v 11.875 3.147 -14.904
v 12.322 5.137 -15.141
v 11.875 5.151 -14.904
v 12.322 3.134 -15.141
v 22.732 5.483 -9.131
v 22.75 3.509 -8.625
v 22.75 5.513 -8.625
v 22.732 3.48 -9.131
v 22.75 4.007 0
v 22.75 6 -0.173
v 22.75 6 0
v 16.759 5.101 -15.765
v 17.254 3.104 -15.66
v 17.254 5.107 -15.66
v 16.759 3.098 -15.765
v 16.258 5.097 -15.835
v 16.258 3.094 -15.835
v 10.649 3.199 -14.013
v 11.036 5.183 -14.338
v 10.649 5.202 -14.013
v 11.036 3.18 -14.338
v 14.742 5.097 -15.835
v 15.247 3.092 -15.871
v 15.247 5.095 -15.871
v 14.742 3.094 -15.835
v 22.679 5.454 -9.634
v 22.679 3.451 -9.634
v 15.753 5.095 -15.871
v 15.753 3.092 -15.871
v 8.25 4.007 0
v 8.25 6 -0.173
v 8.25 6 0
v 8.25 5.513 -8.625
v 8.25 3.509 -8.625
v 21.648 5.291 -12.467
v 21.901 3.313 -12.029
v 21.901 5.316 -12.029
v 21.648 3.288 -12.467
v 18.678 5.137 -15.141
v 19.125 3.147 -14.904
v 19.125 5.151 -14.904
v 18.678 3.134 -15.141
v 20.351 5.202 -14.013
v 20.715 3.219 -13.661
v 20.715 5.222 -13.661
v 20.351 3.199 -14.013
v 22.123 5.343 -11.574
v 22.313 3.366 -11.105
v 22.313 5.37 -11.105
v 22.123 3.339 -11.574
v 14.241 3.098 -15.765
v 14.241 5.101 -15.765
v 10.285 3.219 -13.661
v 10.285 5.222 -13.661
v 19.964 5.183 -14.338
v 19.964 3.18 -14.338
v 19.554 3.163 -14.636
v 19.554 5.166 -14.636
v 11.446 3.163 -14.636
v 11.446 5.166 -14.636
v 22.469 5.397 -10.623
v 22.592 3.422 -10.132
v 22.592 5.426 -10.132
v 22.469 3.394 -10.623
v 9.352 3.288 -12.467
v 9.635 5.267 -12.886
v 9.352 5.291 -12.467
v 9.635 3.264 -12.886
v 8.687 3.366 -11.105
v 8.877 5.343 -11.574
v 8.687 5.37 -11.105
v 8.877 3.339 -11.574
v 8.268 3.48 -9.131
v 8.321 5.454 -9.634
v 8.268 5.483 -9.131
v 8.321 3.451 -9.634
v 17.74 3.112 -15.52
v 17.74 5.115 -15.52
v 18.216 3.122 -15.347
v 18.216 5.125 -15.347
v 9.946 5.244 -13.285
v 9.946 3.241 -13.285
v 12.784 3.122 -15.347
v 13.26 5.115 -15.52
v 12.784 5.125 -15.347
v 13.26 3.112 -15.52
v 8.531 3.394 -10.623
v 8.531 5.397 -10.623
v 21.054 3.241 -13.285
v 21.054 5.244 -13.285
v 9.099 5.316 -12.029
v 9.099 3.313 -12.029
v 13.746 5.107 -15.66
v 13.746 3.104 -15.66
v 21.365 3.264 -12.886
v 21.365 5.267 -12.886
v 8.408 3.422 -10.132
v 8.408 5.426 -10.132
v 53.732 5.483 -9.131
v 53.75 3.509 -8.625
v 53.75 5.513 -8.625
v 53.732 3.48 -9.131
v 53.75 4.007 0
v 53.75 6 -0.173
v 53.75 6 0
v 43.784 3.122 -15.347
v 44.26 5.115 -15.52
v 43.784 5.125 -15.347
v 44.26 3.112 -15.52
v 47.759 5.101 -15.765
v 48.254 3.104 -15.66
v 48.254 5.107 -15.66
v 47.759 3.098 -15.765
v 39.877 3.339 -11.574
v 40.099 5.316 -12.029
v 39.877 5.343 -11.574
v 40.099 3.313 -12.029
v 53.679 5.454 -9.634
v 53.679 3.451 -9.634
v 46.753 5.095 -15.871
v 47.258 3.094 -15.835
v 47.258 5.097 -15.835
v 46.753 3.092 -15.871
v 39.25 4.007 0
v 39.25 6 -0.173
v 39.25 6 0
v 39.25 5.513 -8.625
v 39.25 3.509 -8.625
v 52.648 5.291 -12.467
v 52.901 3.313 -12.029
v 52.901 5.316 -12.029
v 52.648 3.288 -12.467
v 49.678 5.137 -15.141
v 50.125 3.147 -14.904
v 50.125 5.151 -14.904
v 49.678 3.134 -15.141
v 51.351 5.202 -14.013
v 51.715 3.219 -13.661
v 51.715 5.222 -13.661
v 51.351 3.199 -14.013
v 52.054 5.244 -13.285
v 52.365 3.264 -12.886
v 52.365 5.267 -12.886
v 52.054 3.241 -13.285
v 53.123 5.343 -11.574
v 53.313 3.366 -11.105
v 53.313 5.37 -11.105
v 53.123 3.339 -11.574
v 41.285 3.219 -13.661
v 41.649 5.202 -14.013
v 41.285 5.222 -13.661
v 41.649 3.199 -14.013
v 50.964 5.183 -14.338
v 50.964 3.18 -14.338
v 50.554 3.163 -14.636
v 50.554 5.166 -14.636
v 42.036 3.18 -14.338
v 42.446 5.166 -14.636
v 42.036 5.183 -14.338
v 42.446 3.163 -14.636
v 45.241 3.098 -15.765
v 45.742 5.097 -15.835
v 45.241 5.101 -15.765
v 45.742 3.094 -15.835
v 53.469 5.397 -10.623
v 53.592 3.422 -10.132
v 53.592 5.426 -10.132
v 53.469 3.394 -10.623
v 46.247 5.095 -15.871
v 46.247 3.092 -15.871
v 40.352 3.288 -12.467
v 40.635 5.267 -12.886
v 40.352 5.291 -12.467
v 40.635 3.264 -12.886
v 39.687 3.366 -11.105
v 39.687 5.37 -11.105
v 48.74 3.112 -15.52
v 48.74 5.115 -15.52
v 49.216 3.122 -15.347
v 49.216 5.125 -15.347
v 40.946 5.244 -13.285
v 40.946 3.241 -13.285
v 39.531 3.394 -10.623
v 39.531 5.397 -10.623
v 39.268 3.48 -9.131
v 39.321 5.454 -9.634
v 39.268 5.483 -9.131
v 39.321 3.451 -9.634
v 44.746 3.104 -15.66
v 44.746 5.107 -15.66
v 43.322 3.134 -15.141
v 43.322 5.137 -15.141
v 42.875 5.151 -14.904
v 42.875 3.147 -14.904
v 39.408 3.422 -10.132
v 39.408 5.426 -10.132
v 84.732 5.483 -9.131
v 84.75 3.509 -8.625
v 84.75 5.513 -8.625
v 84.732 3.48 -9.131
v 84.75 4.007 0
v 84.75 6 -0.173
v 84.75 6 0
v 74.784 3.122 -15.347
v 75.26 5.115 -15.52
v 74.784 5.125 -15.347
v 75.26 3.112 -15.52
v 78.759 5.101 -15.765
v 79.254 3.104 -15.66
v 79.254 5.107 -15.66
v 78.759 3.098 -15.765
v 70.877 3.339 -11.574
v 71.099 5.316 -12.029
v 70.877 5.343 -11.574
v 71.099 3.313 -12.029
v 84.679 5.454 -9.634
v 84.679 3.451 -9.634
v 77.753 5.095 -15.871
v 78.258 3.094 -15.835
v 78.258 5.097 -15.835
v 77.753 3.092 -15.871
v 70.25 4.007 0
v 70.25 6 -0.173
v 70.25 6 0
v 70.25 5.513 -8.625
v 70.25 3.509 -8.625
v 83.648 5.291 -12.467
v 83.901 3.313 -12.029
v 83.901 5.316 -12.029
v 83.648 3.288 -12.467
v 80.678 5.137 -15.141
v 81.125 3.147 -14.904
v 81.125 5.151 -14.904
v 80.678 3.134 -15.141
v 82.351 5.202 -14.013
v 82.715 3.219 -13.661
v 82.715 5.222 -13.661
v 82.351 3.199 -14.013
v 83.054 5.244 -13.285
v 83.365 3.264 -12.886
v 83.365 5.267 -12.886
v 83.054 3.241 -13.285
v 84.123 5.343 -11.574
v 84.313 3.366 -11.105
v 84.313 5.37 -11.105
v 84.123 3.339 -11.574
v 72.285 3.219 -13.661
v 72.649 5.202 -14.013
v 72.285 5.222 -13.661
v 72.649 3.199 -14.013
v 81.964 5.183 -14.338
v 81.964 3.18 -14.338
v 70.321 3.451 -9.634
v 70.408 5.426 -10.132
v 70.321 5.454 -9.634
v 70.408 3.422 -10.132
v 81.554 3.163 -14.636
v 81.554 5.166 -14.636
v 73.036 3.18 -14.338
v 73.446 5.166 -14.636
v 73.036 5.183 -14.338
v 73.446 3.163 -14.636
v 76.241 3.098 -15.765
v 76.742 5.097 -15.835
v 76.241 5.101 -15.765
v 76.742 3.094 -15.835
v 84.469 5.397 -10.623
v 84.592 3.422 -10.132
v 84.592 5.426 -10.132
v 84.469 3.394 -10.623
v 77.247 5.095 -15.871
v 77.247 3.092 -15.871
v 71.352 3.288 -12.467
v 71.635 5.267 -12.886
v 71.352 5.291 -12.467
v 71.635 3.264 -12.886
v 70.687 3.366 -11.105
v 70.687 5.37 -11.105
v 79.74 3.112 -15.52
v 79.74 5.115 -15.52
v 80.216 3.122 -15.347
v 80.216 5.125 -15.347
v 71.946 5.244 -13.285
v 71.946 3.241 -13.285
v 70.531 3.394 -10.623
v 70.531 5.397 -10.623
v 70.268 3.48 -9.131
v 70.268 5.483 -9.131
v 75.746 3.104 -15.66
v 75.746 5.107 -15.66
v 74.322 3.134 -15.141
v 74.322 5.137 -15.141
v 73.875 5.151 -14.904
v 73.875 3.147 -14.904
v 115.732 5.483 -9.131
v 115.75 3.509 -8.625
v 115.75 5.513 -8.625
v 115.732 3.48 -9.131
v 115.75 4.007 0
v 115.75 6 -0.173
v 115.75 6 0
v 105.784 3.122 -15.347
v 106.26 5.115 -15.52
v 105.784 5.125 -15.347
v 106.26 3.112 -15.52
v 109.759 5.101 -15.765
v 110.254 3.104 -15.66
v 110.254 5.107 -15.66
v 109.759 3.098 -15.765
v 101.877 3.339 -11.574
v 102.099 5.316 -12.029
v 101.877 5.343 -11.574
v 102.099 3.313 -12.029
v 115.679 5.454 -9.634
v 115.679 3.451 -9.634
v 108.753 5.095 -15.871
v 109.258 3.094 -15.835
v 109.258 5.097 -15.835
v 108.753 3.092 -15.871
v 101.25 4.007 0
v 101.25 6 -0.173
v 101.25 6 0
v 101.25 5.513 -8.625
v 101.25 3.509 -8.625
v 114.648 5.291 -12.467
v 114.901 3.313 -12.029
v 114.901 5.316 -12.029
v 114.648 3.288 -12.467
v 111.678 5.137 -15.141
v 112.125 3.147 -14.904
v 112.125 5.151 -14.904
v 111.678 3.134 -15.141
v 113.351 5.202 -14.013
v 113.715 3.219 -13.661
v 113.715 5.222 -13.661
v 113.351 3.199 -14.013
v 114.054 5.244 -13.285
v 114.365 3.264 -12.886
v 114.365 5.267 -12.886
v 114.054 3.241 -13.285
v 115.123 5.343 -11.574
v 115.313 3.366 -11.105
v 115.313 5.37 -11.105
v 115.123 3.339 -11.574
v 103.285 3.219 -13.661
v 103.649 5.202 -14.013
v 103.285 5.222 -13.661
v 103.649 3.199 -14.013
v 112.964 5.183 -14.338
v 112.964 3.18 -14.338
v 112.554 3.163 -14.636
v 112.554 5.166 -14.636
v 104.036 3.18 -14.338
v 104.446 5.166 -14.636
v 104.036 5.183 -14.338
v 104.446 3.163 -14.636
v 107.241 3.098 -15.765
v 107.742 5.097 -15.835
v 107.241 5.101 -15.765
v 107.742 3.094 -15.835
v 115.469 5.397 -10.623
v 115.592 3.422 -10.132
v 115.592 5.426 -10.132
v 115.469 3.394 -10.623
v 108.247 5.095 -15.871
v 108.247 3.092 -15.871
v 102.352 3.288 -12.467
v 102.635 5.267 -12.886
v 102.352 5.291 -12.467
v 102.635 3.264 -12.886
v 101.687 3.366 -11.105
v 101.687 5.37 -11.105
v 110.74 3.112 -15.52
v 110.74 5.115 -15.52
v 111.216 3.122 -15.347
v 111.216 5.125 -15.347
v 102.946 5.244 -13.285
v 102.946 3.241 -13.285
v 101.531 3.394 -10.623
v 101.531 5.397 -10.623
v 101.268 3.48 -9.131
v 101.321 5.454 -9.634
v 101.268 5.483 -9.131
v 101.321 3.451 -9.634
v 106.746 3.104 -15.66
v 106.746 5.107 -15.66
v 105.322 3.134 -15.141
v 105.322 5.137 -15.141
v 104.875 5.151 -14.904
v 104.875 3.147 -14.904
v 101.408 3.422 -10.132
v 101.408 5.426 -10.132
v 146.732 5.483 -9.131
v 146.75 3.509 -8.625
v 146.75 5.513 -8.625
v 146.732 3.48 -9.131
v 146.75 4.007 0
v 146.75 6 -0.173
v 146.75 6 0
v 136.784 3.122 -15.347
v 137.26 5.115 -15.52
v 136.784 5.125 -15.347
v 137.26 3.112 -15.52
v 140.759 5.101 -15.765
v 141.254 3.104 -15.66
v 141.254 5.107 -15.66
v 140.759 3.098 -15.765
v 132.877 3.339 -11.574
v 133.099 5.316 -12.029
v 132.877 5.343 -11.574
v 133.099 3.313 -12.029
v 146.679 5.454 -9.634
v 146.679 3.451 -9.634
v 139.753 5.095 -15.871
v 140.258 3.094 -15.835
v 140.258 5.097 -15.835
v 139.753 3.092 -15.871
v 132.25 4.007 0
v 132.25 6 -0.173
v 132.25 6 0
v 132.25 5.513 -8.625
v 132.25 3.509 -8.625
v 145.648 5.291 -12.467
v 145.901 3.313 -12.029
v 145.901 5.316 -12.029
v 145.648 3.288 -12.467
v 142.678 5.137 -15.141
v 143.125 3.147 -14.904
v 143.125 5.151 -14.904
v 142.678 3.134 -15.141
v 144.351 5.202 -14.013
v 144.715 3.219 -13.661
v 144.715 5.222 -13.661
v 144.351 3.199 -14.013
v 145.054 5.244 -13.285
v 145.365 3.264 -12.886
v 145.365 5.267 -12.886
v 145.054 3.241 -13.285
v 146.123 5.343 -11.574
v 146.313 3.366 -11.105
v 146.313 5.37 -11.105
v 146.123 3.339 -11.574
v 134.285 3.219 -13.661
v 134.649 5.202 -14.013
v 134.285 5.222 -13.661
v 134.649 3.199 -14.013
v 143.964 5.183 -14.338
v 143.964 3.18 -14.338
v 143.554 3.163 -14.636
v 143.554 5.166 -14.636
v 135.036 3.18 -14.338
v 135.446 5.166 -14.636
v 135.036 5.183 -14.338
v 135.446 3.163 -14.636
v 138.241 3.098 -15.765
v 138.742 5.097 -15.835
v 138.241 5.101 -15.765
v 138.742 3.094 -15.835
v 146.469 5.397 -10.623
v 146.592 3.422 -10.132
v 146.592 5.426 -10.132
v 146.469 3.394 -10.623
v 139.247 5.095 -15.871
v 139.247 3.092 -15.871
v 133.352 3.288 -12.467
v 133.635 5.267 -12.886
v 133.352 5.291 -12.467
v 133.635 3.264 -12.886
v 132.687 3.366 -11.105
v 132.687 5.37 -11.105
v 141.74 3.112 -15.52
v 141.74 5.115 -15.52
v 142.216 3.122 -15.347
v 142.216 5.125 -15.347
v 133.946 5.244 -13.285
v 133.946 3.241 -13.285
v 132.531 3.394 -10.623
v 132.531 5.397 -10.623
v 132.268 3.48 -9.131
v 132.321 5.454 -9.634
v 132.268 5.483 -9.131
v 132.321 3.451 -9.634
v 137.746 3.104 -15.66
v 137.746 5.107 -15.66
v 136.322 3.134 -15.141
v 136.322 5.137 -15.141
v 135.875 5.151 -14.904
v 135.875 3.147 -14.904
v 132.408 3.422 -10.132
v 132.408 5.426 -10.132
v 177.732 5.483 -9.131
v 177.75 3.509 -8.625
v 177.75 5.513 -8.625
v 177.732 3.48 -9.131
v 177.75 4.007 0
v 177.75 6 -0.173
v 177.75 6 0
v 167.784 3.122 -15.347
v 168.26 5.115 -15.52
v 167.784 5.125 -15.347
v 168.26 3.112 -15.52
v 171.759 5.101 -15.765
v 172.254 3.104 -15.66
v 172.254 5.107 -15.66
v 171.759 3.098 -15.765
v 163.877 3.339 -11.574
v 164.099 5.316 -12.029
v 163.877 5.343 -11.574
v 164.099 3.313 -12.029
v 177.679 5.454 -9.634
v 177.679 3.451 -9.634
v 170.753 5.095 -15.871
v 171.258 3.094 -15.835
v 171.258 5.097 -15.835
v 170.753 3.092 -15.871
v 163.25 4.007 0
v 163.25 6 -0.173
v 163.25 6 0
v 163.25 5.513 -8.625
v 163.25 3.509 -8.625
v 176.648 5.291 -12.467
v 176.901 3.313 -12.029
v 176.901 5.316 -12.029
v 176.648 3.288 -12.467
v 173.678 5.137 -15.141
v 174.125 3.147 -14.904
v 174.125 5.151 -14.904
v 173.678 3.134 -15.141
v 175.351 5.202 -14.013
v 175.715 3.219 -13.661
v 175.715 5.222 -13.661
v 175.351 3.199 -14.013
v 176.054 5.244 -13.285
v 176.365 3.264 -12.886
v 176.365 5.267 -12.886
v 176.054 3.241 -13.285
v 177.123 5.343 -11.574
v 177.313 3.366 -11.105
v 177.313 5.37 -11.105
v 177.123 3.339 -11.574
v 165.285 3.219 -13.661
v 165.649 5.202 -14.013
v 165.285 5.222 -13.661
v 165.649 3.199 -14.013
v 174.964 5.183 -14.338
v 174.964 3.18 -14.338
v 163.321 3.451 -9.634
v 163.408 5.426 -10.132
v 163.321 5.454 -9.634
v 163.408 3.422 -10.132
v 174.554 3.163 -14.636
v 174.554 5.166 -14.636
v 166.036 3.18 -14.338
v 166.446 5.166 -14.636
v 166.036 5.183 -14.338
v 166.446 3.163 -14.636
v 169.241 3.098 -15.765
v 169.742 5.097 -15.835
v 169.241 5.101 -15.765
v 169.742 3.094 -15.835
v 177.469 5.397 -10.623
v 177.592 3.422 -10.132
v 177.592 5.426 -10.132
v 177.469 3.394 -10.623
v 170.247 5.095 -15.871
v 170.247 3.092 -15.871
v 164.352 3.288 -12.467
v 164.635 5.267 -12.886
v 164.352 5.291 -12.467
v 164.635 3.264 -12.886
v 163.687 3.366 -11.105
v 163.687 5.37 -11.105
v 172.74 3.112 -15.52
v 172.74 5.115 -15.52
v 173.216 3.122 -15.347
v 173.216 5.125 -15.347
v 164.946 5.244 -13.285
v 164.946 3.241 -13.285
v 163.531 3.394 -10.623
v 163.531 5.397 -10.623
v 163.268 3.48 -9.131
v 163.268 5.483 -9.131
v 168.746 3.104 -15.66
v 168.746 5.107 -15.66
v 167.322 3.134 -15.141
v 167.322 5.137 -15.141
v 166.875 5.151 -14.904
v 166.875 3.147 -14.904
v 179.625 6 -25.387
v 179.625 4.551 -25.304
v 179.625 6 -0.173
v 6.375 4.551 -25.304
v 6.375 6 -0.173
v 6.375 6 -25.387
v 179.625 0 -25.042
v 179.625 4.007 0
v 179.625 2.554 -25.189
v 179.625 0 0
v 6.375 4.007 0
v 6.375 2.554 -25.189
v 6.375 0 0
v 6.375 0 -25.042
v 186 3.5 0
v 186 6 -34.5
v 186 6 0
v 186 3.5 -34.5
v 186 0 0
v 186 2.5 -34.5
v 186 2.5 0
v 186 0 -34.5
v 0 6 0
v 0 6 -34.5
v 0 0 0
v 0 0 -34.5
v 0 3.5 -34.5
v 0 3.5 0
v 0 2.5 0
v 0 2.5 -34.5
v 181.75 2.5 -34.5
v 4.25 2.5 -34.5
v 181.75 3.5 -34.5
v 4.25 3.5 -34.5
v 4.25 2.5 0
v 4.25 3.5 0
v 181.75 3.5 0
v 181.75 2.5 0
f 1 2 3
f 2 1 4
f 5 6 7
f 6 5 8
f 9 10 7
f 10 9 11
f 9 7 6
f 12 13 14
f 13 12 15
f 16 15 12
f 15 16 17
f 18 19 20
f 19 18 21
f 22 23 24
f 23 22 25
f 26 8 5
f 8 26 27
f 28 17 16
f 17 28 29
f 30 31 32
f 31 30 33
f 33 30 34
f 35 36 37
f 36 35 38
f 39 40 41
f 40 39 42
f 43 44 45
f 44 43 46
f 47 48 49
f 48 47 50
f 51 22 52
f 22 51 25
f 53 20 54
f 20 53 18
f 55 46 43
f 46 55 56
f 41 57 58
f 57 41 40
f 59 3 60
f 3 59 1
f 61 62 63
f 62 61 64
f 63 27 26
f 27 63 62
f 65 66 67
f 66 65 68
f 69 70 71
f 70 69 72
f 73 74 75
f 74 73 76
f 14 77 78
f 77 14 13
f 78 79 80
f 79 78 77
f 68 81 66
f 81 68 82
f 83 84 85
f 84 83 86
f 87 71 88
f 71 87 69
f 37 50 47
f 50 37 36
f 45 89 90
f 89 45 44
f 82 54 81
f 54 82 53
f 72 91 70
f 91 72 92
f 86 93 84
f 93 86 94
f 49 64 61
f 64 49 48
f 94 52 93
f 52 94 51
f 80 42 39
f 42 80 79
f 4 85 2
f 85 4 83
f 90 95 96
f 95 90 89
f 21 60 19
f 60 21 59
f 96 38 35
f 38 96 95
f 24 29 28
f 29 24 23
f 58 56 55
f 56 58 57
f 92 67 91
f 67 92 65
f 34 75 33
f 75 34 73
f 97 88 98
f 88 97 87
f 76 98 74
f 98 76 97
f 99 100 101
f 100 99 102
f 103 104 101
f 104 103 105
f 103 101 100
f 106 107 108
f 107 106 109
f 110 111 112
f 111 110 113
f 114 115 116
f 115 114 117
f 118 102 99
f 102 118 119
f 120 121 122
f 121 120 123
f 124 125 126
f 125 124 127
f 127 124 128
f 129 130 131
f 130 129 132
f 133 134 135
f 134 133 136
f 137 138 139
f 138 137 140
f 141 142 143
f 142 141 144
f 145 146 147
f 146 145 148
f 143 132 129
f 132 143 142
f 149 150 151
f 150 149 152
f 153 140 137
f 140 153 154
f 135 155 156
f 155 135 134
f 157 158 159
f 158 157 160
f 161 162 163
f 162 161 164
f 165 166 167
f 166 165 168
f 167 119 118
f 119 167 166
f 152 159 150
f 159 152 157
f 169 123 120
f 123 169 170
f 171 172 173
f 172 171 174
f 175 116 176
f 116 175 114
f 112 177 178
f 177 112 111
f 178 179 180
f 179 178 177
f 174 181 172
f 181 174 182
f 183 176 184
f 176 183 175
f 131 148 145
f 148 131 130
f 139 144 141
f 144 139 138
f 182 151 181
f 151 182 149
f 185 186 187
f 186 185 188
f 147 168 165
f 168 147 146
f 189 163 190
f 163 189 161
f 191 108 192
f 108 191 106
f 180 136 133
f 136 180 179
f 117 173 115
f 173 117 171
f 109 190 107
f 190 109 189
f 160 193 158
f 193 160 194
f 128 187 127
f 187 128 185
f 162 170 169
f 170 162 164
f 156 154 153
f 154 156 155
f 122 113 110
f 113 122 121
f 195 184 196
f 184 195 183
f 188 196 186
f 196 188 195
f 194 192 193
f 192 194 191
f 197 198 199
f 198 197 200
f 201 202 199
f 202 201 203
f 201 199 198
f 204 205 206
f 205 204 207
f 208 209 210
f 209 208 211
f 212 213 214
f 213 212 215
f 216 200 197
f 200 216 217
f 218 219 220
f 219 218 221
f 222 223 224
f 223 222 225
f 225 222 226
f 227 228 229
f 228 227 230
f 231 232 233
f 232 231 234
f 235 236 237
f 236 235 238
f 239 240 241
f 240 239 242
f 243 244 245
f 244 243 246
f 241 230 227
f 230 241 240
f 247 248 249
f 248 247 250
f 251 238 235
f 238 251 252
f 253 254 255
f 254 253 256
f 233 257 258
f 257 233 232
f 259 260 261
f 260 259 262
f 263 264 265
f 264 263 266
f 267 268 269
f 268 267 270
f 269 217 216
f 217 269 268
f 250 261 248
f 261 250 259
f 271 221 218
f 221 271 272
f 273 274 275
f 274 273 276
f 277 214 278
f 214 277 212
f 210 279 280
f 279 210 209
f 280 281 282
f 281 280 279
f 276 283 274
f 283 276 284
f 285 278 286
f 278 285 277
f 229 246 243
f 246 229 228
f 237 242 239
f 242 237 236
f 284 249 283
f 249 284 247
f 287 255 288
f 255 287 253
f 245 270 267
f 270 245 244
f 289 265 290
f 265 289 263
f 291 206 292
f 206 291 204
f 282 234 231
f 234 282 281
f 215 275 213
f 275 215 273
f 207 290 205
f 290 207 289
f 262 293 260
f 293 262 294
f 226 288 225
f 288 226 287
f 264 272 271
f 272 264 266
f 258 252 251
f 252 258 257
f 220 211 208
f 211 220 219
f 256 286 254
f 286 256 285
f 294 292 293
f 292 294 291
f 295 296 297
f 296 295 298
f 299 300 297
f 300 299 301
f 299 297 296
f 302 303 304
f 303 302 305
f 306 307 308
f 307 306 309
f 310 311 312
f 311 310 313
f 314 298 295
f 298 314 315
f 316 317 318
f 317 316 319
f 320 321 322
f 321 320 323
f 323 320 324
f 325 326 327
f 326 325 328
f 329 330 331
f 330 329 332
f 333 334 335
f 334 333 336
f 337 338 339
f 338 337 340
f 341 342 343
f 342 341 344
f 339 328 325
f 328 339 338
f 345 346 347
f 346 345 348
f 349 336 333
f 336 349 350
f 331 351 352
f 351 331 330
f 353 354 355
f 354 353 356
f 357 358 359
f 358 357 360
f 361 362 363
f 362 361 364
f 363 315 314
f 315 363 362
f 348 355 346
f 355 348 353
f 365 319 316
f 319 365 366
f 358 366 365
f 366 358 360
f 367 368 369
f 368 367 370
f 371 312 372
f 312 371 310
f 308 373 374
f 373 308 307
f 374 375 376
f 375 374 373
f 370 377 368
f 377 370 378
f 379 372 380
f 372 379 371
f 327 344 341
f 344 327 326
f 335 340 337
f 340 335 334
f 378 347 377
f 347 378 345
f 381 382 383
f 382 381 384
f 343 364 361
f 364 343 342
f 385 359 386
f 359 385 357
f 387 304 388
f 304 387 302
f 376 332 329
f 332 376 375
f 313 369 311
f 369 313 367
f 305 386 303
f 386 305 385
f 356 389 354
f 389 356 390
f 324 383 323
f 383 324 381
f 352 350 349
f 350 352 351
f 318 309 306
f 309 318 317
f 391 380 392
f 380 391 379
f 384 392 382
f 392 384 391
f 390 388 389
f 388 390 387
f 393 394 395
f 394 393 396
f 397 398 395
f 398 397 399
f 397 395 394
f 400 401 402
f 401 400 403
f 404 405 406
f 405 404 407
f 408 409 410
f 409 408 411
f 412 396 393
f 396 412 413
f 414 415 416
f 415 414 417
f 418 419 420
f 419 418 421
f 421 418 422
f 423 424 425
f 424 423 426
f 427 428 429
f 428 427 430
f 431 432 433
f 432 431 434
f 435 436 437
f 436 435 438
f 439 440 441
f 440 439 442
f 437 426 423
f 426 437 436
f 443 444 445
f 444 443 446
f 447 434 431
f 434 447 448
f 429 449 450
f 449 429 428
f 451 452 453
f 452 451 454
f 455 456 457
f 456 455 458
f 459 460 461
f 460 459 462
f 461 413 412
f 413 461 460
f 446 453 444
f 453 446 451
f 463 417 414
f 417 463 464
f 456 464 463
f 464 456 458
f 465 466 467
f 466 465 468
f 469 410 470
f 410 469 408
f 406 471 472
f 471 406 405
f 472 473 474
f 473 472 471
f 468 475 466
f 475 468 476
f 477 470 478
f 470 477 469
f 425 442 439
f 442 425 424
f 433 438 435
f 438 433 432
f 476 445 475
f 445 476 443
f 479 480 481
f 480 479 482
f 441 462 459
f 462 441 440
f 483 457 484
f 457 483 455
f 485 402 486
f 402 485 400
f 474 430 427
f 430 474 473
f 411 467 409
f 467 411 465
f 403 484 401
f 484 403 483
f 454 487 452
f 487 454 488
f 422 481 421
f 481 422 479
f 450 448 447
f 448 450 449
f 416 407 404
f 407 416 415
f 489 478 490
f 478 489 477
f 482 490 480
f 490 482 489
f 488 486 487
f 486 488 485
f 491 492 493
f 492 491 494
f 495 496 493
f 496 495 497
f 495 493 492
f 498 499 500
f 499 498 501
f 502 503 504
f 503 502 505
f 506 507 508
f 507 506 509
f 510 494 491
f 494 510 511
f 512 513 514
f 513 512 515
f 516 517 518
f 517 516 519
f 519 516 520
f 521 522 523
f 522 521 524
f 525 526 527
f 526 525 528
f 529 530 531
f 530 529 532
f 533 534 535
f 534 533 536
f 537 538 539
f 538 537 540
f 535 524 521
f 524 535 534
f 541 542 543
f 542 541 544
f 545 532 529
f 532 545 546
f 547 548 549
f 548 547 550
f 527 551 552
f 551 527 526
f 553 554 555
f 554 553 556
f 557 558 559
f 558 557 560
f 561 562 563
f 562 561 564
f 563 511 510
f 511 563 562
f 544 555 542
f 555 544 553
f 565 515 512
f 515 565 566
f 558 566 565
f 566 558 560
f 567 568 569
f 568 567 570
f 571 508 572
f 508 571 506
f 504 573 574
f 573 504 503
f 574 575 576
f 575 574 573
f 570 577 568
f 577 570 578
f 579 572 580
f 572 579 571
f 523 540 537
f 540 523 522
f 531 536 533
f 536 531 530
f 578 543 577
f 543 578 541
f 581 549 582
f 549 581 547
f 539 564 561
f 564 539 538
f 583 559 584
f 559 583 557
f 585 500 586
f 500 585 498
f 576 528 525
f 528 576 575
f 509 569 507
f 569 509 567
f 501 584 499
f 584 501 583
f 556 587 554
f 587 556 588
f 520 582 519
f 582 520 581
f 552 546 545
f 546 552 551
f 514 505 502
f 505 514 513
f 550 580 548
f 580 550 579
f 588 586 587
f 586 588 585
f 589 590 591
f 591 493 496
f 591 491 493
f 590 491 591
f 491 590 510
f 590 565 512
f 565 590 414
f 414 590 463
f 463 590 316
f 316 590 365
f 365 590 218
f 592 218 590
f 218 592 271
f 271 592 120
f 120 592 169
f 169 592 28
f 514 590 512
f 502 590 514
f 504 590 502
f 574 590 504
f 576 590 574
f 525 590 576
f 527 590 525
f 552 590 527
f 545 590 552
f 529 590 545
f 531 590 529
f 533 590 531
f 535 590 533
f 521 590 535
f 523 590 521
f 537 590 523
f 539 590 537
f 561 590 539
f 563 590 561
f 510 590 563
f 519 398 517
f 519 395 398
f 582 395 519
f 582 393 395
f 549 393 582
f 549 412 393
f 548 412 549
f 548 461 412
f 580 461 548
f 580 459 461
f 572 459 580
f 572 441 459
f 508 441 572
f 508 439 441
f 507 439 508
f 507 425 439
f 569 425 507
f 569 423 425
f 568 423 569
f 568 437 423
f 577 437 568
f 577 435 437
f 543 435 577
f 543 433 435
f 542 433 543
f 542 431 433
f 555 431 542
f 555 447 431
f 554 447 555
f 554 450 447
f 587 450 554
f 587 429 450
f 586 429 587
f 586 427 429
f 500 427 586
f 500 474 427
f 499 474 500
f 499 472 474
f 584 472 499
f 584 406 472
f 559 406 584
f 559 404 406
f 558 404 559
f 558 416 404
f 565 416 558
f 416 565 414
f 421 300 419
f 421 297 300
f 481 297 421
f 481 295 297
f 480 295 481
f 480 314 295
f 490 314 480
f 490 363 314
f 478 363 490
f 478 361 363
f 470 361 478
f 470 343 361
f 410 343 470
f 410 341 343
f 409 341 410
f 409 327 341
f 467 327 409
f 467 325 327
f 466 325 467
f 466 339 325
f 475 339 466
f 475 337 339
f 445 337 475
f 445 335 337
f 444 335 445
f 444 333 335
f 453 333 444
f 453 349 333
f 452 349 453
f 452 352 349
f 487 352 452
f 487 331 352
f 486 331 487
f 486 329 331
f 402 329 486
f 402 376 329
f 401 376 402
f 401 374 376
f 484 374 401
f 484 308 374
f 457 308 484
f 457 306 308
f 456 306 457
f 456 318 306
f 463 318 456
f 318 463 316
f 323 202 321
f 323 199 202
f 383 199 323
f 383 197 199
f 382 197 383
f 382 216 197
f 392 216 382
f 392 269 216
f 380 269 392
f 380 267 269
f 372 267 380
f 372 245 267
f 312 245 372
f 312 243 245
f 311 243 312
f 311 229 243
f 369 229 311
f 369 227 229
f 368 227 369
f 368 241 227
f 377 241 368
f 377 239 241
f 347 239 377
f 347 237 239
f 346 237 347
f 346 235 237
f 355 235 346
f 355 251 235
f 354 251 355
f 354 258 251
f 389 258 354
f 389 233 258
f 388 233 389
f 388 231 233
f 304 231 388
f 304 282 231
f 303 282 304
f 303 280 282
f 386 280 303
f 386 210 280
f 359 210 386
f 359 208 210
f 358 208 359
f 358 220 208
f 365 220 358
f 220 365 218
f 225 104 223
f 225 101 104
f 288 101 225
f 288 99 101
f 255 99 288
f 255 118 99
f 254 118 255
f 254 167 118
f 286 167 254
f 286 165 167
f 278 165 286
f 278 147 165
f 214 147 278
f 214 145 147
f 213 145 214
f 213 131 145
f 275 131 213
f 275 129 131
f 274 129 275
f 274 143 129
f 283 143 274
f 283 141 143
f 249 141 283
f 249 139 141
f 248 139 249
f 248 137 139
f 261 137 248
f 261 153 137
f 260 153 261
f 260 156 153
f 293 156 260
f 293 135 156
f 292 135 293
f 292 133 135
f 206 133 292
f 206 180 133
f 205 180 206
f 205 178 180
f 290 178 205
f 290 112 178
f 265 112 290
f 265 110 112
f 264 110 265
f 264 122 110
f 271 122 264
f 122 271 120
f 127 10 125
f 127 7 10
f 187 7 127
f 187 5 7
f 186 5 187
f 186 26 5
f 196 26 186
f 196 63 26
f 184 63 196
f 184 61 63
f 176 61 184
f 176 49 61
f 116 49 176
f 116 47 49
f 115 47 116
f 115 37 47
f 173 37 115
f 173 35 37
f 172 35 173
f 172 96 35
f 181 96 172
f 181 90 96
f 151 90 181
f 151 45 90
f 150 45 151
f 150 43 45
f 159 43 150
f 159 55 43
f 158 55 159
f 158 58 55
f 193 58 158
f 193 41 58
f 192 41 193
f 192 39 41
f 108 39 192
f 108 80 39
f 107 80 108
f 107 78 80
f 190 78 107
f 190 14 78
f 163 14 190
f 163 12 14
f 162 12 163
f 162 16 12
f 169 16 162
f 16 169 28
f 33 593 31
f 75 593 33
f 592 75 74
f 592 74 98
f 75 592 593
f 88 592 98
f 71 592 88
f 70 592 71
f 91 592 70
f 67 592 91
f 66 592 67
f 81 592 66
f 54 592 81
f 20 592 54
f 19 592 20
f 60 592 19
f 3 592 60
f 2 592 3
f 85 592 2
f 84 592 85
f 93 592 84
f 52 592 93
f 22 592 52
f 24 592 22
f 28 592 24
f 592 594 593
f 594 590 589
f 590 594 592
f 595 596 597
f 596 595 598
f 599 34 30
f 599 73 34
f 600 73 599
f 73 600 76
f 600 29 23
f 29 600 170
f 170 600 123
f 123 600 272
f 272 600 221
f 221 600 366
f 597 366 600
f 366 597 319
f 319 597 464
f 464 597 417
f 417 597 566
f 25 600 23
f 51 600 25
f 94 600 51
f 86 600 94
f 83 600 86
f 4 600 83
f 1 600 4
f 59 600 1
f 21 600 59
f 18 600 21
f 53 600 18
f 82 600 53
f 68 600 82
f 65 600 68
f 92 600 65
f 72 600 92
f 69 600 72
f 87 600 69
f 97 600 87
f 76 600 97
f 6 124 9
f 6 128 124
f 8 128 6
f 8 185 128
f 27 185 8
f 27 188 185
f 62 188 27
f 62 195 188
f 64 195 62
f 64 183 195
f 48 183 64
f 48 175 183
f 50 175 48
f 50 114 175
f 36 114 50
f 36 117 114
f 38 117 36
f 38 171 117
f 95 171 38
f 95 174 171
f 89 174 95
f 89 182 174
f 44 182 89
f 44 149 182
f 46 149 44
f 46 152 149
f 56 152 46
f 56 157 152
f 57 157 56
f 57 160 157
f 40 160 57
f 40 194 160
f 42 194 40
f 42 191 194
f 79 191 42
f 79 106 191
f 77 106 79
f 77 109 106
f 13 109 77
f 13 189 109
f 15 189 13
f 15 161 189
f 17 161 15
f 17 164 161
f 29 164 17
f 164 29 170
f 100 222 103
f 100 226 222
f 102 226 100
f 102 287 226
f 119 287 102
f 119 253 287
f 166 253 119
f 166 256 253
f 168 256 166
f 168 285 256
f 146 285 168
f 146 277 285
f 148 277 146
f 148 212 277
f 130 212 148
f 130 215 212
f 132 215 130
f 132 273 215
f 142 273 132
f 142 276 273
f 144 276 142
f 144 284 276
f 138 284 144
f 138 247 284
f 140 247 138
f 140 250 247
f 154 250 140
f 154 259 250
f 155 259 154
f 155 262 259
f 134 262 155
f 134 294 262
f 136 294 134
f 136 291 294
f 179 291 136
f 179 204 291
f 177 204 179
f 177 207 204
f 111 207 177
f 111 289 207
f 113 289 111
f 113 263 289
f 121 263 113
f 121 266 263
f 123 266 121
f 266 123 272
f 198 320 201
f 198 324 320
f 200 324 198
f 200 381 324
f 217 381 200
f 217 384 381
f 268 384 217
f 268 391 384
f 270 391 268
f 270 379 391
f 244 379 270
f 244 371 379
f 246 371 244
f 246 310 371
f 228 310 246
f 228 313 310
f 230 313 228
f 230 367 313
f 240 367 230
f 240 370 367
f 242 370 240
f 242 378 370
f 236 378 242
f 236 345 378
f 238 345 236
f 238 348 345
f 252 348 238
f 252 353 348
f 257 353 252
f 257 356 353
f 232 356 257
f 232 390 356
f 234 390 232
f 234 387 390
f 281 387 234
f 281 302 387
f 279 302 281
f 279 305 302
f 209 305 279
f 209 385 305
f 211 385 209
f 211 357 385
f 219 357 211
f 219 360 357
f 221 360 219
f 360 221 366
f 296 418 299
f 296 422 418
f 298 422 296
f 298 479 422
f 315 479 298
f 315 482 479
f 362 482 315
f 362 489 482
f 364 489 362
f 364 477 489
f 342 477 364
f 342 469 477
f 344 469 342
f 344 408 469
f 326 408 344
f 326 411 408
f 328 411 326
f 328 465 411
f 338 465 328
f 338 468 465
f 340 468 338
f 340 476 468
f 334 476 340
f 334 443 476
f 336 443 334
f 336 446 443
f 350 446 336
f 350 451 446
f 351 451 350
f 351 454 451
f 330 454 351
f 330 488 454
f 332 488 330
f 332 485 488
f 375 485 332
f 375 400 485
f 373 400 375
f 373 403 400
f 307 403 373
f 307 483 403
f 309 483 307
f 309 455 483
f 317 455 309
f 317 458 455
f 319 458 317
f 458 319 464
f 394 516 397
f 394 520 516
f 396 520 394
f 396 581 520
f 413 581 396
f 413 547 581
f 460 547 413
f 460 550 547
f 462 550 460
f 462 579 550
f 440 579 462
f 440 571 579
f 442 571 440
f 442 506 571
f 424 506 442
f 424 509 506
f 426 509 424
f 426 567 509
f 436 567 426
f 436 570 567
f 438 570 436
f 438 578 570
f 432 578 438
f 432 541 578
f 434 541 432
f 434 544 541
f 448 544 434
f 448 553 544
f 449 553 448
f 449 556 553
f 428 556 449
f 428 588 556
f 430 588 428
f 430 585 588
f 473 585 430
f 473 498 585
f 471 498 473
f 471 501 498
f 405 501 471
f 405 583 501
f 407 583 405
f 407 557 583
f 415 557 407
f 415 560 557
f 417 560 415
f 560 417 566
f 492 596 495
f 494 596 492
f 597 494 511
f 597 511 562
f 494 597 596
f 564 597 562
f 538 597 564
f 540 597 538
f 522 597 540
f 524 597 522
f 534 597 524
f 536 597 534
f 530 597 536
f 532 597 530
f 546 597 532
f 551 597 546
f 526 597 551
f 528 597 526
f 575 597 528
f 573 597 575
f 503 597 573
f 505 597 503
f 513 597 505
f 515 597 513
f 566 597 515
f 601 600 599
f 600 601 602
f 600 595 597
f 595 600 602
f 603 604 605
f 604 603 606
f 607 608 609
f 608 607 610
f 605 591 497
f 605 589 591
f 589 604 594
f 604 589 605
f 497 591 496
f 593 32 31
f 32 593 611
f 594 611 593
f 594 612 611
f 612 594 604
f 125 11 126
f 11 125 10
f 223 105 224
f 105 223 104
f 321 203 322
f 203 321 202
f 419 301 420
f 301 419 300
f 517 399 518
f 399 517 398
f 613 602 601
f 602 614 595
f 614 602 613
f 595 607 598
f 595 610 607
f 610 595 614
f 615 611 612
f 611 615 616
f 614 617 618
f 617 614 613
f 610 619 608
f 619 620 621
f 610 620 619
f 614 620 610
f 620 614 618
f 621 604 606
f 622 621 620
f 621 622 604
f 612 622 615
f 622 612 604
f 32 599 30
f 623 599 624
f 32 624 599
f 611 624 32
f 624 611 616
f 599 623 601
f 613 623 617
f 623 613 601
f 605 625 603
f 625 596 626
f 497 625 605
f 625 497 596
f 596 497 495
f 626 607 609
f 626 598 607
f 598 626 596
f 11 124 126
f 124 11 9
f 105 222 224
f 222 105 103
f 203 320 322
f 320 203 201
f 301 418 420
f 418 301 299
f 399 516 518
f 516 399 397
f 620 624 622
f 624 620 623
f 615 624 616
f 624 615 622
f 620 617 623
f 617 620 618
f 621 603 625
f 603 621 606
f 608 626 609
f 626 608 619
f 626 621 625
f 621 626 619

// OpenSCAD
$fn = 0 + 0;
$fs = 0.1 + 0; // HQ cylinders
$fa = 4 + 0; // HQ spheres/hulls

// number of hooks wide
num = 6; // [1:18]

// width of the slots
paint_slot_width = 14.5;
// space between the slot centres
paint_slot_spacing = 31;

// space between the hook centres
hook_spacing = 31;

shelf_height = 6;
shelf_thickness = 2;
shelf_width = hook_spacing * num;

hook_width = 8.5;
hook_depth = 34.5;
hook_height = 1;

usable_shelf_width = shelf_width-(hook_width*1.5) -1;
usable_num_slots = round(usable_shelf_width/paint_slot_spacing);

num_slots = usable_num_slots;
shelf_centre = (shelf_width/2);
holes_width = (paint_slot_spacing * (num_slots-1)) ;
holes_centre = (shelf_centre - (holes_width/2));

module paint_slot(){
    hull(){
        cylinder(r=paint_slot_width/2, h=30);
            translate([0, hook_depth/4, 0])
                cylinder(r=paint_slot_width/2, h=30);
    }    
}

rotate([-90, 0, 0]){
//rotate([0, 0, 0]){

    difference(){
        cube([shelf_width, hook_depth, shelf_height]);

        //paint slots
        translate([holes_centre, 0, -10]){
            for(i=[0:num_slots-1]){
                translate([paint_slot_spacing*i, 0, 0])
                    paint_slot();
            }
        }

        //tilt neg
        rotate([-3.3, 0, 0]){
            translate([((hook_width*1.5)/2), 0-(1/2)-10, shelf_height])
                cube([shelf_width-(hook_width*1.5), hook_depth+1, shelf_height]);
            translate([((hook_width*1.5)/2), 0-(1/2)-10, 0-shelf_thickness ])
                cube([shelf_width-(hook_width*1.5), hook_depth+1, shelf_height]);
        }

        translate([0-(hook_width/2), 0-1, (shelf_height-hook_height)/2])
            cube([hook_width, hook_depth+(1*2), hook_height]);

        translate([shelf_width-(hook_width/2), 0-1, (shelf_height-hook_height)/2])
            cube([hook_width, hook_depth+(1*2), hook_height]);
    }
}
